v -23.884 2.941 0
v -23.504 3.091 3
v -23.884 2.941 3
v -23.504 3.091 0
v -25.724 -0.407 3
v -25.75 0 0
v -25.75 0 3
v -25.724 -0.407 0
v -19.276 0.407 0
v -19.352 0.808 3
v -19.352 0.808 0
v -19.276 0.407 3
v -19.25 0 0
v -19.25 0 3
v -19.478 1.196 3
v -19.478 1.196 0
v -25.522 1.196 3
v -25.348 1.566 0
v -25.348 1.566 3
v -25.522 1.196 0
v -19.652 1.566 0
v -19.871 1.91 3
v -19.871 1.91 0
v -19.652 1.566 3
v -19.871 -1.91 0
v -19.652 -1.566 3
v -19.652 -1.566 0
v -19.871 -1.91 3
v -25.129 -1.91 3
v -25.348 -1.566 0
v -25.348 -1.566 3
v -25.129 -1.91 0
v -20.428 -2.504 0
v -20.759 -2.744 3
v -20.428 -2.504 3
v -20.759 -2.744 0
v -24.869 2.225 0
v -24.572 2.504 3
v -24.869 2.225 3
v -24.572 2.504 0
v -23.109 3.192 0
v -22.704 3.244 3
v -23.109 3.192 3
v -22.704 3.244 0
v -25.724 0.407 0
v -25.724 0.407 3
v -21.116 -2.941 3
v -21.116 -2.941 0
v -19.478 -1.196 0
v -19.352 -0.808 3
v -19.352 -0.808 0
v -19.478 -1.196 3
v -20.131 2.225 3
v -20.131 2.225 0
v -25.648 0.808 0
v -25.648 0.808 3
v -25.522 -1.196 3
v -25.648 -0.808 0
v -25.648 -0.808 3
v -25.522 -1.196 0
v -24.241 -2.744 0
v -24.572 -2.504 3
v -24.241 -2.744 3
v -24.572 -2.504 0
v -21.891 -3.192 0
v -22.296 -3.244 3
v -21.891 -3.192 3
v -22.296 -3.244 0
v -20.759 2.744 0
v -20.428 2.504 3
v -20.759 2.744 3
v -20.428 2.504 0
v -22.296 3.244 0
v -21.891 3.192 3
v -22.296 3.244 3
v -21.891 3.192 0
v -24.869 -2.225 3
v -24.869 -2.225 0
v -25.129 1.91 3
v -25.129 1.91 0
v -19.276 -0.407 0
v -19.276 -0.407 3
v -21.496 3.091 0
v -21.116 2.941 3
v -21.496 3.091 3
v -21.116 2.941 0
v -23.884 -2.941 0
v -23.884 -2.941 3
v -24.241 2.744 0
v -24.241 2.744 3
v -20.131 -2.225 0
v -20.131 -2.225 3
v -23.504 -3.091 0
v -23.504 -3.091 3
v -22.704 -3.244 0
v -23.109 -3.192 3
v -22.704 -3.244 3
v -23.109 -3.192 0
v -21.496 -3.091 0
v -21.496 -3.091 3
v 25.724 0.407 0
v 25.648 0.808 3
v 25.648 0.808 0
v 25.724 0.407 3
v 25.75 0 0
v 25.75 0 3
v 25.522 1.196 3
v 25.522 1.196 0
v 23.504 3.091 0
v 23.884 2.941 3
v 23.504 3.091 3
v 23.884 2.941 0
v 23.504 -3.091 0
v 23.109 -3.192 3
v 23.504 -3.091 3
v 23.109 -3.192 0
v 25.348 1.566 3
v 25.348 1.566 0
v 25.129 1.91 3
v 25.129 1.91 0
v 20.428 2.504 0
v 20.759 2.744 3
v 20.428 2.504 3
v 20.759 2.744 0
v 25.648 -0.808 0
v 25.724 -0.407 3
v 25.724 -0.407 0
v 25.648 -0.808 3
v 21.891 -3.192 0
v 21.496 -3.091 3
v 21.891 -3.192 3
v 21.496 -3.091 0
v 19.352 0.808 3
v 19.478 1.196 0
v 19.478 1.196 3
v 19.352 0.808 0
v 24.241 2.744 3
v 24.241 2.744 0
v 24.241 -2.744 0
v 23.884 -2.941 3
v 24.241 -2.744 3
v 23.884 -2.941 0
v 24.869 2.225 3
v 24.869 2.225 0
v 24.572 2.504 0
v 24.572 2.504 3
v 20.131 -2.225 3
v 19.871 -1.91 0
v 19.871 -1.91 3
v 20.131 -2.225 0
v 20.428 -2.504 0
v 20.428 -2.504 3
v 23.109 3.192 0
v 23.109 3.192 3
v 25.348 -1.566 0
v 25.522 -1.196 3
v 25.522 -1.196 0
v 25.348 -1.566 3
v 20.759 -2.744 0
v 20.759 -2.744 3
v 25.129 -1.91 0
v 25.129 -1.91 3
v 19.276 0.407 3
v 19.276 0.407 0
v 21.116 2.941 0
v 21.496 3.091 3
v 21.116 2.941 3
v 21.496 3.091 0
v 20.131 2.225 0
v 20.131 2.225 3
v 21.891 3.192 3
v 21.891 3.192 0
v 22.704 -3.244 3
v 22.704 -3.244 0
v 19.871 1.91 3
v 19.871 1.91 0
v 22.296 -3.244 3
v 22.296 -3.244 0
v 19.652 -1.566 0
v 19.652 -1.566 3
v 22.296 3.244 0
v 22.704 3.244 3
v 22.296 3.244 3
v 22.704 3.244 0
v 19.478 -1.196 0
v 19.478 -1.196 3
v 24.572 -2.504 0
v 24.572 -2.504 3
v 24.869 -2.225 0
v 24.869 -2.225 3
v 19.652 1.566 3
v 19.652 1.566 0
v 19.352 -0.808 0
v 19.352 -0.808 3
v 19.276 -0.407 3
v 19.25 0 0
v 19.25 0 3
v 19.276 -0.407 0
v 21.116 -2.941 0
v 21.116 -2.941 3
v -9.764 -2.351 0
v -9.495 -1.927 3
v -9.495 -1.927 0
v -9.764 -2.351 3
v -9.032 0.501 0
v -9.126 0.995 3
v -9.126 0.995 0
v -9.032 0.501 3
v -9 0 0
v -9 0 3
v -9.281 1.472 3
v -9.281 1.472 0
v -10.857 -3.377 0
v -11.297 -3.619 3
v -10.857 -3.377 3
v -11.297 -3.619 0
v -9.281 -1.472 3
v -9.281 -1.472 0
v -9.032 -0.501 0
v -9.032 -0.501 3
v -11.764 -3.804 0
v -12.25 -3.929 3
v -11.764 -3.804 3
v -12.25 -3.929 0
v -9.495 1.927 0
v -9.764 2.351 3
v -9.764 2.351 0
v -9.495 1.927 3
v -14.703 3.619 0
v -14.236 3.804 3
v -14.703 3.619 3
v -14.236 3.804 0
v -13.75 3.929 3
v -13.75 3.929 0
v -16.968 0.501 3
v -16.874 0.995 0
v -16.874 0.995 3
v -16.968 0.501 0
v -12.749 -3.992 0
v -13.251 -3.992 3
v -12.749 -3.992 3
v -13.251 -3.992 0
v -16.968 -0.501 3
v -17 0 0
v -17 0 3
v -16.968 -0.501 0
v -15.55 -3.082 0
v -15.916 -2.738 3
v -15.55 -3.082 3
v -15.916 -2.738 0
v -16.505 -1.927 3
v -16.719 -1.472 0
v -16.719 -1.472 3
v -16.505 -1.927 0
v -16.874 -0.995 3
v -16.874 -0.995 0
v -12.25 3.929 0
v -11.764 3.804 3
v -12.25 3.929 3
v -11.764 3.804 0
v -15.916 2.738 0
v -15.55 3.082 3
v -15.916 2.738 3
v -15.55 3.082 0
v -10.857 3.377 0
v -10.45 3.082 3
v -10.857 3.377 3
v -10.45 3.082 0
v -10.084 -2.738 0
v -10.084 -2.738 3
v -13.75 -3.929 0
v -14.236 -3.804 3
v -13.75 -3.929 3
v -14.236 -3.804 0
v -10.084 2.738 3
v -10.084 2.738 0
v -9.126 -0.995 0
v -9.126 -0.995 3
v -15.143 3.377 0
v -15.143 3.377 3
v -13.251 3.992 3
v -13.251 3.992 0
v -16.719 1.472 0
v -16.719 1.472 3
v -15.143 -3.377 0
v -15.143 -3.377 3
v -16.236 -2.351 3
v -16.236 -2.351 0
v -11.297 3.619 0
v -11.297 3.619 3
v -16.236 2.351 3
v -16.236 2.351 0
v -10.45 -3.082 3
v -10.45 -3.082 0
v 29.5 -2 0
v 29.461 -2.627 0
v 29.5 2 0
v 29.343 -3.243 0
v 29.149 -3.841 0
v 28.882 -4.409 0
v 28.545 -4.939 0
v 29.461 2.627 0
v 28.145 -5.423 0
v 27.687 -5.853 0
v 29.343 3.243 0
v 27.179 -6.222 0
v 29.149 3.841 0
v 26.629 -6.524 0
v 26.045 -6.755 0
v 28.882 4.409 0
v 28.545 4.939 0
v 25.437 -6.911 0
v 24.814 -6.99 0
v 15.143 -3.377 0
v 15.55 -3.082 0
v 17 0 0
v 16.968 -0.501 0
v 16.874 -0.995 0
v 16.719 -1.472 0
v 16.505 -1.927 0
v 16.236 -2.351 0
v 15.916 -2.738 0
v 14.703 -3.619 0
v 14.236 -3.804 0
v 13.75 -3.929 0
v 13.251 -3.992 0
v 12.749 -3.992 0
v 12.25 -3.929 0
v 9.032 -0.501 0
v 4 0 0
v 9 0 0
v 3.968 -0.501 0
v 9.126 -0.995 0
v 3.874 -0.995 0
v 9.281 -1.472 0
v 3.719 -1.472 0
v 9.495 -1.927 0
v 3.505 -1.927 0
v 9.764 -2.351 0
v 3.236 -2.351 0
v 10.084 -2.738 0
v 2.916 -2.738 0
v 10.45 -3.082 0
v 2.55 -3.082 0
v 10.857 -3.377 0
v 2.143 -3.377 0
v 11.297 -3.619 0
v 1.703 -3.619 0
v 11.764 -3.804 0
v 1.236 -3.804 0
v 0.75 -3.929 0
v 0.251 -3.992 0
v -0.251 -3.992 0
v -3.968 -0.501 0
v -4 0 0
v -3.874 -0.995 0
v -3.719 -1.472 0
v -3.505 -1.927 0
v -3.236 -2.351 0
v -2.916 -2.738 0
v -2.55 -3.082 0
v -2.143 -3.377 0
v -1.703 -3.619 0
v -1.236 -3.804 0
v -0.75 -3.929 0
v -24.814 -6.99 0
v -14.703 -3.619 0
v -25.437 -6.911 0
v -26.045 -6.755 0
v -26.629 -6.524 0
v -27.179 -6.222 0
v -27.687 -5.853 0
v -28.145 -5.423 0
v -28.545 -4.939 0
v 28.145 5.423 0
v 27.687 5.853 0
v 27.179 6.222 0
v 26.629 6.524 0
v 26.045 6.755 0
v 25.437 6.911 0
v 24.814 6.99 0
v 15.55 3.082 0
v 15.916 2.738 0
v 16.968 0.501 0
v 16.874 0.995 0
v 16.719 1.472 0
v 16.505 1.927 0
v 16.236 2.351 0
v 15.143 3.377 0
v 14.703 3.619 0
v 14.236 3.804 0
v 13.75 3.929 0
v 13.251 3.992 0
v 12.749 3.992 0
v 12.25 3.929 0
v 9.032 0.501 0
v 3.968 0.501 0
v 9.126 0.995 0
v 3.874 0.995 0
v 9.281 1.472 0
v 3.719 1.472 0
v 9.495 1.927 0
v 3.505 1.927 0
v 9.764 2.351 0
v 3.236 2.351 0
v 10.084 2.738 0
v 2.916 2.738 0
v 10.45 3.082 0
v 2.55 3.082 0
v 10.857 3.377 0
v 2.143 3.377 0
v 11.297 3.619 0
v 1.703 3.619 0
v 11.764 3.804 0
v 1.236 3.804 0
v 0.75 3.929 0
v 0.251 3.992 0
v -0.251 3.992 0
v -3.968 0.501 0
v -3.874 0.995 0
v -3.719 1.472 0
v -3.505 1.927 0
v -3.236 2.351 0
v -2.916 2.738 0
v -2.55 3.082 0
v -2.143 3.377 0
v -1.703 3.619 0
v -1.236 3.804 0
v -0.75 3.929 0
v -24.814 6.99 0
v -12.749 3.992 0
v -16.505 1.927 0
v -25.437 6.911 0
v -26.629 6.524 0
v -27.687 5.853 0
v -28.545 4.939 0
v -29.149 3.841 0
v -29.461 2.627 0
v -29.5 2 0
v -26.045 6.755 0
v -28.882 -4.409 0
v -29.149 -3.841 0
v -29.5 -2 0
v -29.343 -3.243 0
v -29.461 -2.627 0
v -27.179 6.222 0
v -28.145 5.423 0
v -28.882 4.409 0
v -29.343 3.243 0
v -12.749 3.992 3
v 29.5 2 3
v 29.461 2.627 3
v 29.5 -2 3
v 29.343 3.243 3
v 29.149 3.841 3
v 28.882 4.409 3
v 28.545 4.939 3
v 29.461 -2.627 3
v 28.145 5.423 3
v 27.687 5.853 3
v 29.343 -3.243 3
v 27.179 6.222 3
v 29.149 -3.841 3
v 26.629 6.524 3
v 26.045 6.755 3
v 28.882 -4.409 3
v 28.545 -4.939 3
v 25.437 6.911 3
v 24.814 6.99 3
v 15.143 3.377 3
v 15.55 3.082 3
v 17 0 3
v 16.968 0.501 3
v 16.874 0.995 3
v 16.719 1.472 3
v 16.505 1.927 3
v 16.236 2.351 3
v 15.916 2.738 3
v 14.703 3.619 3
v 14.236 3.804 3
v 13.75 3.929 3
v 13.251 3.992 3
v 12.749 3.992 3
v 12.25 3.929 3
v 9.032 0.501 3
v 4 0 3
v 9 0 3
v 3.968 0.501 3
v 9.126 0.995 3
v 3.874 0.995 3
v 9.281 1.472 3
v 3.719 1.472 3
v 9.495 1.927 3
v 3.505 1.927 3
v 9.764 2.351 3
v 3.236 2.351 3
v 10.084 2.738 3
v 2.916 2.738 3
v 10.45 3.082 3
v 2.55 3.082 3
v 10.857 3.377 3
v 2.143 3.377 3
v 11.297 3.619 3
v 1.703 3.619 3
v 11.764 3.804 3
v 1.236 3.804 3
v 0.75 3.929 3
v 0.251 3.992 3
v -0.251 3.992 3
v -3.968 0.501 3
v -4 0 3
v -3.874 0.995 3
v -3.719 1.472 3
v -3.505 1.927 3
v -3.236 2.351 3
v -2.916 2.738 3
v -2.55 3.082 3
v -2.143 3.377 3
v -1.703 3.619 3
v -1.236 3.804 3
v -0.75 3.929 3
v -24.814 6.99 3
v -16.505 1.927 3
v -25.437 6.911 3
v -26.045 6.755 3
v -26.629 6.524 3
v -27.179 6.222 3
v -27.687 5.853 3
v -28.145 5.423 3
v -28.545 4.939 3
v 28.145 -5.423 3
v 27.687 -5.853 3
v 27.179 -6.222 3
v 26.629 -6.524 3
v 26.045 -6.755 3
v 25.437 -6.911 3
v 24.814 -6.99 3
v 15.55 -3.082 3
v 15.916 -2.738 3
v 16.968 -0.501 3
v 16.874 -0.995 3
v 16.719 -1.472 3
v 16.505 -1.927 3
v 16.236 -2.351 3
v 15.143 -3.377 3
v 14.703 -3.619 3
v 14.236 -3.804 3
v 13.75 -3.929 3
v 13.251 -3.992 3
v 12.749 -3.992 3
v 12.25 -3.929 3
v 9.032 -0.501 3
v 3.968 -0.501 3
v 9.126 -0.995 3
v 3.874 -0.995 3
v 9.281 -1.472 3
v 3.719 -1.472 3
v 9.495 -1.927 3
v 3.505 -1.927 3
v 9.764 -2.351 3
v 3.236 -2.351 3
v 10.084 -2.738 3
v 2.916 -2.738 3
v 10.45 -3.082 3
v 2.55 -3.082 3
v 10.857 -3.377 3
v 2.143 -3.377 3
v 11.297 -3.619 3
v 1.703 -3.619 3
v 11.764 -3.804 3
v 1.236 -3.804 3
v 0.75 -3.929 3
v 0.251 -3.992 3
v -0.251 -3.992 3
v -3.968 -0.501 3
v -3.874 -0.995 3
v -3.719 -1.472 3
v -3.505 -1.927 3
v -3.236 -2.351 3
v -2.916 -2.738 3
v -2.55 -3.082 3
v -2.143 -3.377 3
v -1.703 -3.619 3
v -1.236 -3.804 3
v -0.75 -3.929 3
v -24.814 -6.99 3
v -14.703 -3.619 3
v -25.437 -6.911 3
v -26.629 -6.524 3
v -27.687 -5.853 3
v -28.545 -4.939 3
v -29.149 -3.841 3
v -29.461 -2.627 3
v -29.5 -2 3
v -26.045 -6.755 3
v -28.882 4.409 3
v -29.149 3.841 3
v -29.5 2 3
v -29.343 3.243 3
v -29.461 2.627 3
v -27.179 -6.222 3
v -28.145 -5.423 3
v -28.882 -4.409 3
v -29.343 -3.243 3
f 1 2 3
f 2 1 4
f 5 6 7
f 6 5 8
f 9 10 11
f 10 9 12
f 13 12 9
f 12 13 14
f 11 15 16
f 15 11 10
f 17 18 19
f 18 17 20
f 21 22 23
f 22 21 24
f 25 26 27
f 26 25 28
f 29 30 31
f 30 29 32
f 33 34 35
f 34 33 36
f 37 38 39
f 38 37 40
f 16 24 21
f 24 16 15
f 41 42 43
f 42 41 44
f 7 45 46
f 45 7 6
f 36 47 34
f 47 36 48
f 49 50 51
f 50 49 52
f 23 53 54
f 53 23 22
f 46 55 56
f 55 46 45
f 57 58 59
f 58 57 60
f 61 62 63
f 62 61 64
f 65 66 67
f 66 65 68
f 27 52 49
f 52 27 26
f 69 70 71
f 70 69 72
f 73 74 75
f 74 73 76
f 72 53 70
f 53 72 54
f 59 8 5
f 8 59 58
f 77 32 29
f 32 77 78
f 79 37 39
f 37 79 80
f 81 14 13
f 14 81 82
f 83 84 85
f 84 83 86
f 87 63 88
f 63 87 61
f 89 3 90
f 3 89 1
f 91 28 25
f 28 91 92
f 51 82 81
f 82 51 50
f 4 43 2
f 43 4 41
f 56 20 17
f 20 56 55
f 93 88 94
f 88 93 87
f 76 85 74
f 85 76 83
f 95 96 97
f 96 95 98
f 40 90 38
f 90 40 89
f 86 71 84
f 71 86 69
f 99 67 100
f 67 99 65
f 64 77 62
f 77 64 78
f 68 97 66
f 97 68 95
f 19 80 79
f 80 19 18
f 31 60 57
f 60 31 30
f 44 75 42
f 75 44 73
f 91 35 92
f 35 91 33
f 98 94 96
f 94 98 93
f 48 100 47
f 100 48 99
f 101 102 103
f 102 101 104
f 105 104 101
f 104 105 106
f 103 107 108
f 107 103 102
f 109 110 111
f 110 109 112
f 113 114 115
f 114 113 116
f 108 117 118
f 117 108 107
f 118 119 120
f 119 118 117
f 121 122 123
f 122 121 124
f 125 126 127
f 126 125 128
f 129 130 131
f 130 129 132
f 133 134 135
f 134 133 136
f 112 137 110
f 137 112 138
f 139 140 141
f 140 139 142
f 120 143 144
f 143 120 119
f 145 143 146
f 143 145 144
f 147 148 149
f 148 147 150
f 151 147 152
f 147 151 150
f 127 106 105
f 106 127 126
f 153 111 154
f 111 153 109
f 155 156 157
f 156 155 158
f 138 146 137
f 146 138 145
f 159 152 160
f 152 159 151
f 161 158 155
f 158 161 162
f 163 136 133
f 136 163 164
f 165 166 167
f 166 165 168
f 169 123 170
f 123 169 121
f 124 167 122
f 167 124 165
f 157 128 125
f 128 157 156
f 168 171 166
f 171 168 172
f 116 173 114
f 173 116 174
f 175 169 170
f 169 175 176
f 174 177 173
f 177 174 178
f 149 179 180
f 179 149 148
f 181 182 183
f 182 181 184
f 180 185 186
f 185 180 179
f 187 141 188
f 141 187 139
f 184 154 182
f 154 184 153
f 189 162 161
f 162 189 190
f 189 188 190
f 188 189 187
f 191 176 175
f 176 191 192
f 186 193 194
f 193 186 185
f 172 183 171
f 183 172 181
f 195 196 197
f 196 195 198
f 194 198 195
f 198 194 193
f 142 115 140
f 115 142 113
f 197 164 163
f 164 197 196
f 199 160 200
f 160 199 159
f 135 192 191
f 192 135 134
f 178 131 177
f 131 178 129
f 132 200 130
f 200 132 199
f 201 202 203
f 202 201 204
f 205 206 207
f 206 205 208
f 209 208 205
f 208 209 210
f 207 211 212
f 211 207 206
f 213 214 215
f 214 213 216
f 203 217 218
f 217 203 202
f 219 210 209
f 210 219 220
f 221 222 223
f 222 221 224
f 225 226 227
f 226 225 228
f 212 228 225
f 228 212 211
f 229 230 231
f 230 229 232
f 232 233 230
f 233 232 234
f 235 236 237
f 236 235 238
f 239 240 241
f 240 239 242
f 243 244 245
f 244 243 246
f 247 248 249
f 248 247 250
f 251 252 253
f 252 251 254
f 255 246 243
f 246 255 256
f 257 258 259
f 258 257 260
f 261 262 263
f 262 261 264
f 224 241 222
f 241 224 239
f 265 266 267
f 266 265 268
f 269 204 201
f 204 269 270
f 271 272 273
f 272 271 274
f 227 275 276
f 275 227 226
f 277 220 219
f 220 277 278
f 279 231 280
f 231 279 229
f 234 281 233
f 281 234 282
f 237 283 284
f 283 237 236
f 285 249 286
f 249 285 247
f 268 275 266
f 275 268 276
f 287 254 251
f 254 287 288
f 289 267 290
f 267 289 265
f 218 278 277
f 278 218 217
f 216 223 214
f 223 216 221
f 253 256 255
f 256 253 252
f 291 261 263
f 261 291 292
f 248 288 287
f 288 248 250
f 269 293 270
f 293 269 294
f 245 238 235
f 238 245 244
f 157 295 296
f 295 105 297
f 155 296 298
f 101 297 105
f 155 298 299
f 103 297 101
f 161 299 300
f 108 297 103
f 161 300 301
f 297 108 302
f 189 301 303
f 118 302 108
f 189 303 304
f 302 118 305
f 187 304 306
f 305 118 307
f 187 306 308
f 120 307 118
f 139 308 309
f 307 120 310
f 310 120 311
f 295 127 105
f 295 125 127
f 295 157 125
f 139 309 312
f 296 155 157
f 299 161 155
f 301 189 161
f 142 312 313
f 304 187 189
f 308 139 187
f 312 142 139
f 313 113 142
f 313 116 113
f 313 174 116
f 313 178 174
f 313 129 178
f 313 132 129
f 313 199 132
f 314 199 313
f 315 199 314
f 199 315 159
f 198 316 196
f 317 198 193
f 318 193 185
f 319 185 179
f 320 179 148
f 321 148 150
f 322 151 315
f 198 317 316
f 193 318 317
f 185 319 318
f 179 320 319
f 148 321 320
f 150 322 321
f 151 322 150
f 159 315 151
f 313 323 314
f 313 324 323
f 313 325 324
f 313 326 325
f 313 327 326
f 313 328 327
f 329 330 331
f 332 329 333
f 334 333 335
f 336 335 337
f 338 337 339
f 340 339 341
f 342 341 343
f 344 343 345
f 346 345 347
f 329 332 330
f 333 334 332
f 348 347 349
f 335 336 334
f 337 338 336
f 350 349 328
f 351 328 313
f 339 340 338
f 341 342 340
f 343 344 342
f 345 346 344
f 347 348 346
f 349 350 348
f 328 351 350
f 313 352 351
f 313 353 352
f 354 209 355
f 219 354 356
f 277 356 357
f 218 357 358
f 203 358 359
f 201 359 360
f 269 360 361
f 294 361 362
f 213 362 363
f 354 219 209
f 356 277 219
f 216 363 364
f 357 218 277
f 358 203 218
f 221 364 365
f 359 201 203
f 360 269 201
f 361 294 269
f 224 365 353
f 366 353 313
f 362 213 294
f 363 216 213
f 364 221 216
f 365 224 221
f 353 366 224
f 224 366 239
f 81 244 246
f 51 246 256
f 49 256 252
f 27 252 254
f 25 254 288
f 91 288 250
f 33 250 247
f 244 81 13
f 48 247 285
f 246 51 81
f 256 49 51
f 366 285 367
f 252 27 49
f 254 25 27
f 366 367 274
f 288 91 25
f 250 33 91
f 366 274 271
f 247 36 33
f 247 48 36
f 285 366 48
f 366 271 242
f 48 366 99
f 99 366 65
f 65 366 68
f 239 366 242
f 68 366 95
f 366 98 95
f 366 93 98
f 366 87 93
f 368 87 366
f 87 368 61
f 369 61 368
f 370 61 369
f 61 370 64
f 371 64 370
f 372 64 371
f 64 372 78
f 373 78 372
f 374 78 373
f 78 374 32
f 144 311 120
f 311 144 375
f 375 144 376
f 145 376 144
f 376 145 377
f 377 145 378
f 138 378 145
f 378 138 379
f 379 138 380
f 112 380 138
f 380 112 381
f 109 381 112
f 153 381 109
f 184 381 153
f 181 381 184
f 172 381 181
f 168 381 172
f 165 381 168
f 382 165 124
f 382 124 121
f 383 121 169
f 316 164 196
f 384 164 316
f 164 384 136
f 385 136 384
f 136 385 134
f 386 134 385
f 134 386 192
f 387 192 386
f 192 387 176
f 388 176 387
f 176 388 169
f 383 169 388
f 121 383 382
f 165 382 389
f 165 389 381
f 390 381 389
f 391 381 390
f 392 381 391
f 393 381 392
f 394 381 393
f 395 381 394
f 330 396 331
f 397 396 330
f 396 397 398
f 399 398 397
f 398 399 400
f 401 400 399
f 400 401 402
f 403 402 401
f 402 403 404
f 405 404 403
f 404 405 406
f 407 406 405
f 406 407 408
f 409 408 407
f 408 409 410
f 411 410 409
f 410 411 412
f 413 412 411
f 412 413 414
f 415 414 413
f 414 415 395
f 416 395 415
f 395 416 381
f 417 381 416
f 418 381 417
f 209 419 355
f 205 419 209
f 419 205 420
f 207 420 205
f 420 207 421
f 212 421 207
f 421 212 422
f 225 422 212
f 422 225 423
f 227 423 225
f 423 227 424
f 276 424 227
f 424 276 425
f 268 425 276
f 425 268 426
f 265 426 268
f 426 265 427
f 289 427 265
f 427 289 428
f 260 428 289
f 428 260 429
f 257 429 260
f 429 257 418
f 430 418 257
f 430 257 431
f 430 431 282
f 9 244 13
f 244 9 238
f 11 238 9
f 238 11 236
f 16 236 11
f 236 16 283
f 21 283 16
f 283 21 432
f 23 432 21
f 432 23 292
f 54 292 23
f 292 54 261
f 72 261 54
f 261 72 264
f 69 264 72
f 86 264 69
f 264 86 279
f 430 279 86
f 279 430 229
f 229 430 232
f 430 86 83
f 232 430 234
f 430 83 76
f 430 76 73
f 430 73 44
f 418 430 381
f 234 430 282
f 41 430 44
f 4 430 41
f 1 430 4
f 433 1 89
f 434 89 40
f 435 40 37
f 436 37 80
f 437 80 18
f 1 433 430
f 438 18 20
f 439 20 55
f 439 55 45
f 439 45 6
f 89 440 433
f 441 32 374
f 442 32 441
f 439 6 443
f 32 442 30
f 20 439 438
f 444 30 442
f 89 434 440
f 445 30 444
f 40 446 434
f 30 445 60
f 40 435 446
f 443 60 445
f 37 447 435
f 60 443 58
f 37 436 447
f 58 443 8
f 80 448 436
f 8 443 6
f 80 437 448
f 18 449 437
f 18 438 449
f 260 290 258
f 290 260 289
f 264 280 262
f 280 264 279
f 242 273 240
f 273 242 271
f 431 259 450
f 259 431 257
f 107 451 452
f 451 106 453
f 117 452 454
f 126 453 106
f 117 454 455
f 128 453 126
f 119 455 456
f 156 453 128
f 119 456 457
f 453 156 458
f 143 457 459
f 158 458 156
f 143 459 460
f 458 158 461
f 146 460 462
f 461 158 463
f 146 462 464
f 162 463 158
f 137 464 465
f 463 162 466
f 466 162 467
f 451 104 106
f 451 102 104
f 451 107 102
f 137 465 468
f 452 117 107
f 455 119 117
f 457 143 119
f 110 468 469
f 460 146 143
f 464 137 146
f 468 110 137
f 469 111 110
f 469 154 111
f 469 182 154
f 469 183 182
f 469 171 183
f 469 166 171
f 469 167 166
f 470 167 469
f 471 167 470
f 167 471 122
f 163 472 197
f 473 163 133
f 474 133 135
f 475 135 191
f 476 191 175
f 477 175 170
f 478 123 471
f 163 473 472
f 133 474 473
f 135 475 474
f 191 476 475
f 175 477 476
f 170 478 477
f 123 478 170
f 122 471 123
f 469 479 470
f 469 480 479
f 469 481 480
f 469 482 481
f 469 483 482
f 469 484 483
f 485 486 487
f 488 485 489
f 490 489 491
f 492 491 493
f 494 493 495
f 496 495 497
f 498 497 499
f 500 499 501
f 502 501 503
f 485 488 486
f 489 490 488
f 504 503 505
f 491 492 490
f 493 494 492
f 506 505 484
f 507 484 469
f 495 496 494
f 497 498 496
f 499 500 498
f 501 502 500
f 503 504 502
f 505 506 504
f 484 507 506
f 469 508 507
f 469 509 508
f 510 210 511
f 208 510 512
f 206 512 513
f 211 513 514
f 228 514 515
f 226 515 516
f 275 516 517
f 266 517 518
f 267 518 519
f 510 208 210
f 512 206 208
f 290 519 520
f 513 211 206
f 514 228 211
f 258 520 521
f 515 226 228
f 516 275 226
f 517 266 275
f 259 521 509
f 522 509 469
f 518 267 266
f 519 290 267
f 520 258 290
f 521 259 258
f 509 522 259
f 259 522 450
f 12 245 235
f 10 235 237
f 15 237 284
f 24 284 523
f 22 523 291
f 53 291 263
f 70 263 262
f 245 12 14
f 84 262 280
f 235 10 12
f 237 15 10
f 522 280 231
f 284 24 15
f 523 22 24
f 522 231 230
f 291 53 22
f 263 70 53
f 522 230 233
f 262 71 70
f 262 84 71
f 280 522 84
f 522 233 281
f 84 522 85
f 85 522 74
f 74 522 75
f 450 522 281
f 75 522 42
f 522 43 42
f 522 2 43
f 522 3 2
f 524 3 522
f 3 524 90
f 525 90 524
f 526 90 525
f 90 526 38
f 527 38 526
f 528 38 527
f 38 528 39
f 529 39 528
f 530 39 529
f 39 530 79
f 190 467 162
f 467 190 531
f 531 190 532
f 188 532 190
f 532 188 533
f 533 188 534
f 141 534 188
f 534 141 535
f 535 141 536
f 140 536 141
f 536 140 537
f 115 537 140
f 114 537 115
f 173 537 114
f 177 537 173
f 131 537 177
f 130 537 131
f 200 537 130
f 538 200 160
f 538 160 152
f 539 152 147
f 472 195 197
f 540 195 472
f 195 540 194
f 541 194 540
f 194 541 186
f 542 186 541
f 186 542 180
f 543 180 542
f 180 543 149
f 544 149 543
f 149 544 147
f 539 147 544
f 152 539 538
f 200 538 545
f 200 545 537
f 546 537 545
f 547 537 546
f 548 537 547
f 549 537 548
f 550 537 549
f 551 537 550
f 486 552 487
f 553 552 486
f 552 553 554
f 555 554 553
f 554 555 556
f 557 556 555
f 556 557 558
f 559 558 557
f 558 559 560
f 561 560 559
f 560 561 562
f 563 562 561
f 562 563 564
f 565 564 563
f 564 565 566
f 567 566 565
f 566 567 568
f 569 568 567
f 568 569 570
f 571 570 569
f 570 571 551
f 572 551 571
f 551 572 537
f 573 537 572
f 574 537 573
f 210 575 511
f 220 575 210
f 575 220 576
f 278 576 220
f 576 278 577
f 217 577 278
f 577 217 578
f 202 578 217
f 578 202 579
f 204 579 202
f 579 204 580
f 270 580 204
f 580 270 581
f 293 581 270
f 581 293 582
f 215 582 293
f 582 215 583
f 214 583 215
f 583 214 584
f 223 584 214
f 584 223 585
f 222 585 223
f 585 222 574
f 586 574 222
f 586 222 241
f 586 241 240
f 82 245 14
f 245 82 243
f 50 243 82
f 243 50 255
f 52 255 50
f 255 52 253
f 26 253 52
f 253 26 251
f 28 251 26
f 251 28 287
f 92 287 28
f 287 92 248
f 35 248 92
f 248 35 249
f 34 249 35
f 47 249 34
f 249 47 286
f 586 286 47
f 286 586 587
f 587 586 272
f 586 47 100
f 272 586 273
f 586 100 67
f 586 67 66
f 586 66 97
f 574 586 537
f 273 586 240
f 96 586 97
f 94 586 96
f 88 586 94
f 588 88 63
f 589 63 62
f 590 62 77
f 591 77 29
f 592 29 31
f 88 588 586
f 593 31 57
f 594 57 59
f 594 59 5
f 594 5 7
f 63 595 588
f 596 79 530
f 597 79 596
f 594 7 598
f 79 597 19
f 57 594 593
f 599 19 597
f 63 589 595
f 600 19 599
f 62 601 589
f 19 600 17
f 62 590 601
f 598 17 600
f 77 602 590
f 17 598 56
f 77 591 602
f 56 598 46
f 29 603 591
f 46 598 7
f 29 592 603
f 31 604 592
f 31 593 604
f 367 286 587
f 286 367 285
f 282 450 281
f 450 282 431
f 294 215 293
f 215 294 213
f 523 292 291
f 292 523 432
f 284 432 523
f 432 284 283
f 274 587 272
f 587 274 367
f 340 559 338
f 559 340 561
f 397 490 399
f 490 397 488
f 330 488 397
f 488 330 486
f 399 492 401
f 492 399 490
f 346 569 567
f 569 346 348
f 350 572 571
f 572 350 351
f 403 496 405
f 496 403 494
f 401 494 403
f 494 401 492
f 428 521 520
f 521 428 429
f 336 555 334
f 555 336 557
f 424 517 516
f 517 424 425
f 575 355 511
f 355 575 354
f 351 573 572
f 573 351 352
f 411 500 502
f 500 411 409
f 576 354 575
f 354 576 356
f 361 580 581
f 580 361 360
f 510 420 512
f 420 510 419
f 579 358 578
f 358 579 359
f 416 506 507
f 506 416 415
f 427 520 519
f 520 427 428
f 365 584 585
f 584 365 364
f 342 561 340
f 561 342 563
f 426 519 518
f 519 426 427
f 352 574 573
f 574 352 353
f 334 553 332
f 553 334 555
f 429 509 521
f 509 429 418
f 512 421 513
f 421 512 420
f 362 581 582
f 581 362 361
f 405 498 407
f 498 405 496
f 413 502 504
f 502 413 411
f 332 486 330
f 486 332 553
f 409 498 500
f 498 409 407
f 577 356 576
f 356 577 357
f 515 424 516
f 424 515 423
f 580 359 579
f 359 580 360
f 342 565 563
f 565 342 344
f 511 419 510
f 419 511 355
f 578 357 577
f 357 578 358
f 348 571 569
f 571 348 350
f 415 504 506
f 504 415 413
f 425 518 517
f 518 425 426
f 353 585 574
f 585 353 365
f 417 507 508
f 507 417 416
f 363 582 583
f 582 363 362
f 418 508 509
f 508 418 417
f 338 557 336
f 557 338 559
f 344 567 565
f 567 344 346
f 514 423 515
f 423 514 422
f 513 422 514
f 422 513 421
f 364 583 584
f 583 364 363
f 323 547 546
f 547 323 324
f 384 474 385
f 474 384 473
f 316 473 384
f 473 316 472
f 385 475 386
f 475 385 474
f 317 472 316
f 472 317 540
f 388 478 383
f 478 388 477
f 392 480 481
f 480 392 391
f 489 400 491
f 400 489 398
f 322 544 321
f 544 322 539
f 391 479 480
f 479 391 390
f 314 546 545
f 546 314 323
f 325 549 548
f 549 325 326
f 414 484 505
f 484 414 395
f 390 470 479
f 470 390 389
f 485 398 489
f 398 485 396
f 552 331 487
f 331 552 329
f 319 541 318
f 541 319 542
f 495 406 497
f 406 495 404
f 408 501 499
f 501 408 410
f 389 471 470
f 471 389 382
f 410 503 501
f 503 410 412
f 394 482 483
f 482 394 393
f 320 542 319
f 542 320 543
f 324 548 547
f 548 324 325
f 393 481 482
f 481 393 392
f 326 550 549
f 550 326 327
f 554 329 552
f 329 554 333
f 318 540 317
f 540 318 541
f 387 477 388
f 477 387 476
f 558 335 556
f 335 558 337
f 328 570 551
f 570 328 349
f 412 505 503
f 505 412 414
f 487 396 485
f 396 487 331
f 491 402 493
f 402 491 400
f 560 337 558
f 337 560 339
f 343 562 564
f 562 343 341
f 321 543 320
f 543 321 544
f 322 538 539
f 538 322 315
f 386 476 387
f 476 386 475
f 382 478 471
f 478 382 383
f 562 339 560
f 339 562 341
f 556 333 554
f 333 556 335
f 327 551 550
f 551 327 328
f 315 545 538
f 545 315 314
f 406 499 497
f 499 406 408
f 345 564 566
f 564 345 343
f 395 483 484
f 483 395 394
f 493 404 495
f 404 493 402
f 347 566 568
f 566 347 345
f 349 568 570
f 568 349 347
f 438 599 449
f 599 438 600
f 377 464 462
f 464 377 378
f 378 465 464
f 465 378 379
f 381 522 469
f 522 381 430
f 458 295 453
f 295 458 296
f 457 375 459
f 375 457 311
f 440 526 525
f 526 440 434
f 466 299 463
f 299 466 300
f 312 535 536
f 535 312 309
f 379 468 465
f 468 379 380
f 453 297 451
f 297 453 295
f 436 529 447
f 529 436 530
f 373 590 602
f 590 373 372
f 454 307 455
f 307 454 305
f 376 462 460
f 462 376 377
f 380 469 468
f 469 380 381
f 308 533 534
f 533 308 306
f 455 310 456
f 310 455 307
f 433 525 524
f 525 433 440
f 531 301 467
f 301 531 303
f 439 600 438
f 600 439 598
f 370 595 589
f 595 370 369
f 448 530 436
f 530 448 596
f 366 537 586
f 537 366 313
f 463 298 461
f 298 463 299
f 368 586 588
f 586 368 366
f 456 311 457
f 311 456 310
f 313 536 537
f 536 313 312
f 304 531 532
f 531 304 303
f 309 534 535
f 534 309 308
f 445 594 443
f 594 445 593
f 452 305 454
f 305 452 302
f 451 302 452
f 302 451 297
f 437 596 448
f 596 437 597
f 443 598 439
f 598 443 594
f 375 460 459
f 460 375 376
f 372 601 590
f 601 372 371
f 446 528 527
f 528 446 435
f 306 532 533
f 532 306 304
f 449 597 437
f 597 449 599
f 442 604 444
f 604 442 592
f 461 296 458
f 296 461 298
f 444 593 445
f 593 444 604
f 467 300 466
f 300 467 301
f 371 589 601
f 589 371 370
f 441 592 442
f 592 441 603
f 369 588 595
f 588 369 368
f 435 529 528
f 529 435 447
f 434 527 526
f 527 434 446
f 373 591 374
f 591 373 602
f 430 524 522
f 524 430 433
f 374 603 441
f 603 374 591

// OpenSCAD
$fn = 50;


difference() {
	union() {
		hull() {
			translate(v = [-24.5000000000, 2.0000000000, 0]) {
				cylinder(h = 3, r = 5);
			}
			translate(v = [24.5000000000, 2.0000000000, 0]) {
				cylinder(h = 3, r = 5);
			}
			translate(v = [-24.5000000000, -2.0000000000, 0]) {
				cylinder(h = 3, r = 5);
			}
			translate(v = [24.5000000000, -2.0000000000, 0]) {
				cylinder(h = 3, r = 5);
			}
		}
	}
	union() {
		#translate(v = [-22.5000000000, 0.0000000000, 0]) {
			cylinder(h = 3, r = 3.2500000000);
		}
		#translate(v = [22.5000000000, 0.0000000000, 0]) {
			cylinder(h = 3, r = 3.2500000000);
		}
		#translate(v = [-22.5000000000, 0.0000000000, -100.0000000000]) {
			cylinder(h = 200, r = 3.2500000000);
		}
		#translate(v = [-22.5000000000, 0.0000000000, -100.0000000000]) {
			cylinder(h = 200, r = 3.2500000000);
		}
		#translate(v = [22.5000000000, 0.0000000000, -100.0000000000]) {
			cylinder(h = 200, r = 3.2500000000);
		}
		#translate(v = [22.5000000000, 0.0000000000, -100.0000000000]) {
			cylinder(h = 200, r = 3.2500000000);
		}
		#translate(v = [-22.5000000000, 0.0000000000, 0]) {
			cylinder(h = 3, r = 1.8000000000);
		}
		#translate(v = [22.5000000000, 0.0000000000, 0]) {
			cylinder(h = 3, r = 1.8000000000);
		}
		#translate(v = [-22.5000000000, 0.0000000000, 0]) {
			cylinder(h = 3, r = 1.8000000000);
		}
		#translate(v = [22.5000000000, 0.0000000000, 0]) {
			cylinder(h = 3, r = 1.8000000000);
		}
		#translate(v = [-22.5000000000, 0.0000000000, 0]) {
			cylinder(h = 3, r = 1.8000000000);
		}
		#translate(v = [22.5000000000, 0.0000000000, 0]) {
			cylinder(h = 3, r = 1.8000000000);
		}
		#translate(v = [-13.0000000000, 0, 0]) {
			cylinder(h = 3, r = 4.0000000000);
		}
		#cylinder(h = 3, r = 4.0000000000);
		#translate(v = [13.0000000000, 0, 0]) {
			cylinder(h = 3, r = 4.0000000000);
		}
	}
}
